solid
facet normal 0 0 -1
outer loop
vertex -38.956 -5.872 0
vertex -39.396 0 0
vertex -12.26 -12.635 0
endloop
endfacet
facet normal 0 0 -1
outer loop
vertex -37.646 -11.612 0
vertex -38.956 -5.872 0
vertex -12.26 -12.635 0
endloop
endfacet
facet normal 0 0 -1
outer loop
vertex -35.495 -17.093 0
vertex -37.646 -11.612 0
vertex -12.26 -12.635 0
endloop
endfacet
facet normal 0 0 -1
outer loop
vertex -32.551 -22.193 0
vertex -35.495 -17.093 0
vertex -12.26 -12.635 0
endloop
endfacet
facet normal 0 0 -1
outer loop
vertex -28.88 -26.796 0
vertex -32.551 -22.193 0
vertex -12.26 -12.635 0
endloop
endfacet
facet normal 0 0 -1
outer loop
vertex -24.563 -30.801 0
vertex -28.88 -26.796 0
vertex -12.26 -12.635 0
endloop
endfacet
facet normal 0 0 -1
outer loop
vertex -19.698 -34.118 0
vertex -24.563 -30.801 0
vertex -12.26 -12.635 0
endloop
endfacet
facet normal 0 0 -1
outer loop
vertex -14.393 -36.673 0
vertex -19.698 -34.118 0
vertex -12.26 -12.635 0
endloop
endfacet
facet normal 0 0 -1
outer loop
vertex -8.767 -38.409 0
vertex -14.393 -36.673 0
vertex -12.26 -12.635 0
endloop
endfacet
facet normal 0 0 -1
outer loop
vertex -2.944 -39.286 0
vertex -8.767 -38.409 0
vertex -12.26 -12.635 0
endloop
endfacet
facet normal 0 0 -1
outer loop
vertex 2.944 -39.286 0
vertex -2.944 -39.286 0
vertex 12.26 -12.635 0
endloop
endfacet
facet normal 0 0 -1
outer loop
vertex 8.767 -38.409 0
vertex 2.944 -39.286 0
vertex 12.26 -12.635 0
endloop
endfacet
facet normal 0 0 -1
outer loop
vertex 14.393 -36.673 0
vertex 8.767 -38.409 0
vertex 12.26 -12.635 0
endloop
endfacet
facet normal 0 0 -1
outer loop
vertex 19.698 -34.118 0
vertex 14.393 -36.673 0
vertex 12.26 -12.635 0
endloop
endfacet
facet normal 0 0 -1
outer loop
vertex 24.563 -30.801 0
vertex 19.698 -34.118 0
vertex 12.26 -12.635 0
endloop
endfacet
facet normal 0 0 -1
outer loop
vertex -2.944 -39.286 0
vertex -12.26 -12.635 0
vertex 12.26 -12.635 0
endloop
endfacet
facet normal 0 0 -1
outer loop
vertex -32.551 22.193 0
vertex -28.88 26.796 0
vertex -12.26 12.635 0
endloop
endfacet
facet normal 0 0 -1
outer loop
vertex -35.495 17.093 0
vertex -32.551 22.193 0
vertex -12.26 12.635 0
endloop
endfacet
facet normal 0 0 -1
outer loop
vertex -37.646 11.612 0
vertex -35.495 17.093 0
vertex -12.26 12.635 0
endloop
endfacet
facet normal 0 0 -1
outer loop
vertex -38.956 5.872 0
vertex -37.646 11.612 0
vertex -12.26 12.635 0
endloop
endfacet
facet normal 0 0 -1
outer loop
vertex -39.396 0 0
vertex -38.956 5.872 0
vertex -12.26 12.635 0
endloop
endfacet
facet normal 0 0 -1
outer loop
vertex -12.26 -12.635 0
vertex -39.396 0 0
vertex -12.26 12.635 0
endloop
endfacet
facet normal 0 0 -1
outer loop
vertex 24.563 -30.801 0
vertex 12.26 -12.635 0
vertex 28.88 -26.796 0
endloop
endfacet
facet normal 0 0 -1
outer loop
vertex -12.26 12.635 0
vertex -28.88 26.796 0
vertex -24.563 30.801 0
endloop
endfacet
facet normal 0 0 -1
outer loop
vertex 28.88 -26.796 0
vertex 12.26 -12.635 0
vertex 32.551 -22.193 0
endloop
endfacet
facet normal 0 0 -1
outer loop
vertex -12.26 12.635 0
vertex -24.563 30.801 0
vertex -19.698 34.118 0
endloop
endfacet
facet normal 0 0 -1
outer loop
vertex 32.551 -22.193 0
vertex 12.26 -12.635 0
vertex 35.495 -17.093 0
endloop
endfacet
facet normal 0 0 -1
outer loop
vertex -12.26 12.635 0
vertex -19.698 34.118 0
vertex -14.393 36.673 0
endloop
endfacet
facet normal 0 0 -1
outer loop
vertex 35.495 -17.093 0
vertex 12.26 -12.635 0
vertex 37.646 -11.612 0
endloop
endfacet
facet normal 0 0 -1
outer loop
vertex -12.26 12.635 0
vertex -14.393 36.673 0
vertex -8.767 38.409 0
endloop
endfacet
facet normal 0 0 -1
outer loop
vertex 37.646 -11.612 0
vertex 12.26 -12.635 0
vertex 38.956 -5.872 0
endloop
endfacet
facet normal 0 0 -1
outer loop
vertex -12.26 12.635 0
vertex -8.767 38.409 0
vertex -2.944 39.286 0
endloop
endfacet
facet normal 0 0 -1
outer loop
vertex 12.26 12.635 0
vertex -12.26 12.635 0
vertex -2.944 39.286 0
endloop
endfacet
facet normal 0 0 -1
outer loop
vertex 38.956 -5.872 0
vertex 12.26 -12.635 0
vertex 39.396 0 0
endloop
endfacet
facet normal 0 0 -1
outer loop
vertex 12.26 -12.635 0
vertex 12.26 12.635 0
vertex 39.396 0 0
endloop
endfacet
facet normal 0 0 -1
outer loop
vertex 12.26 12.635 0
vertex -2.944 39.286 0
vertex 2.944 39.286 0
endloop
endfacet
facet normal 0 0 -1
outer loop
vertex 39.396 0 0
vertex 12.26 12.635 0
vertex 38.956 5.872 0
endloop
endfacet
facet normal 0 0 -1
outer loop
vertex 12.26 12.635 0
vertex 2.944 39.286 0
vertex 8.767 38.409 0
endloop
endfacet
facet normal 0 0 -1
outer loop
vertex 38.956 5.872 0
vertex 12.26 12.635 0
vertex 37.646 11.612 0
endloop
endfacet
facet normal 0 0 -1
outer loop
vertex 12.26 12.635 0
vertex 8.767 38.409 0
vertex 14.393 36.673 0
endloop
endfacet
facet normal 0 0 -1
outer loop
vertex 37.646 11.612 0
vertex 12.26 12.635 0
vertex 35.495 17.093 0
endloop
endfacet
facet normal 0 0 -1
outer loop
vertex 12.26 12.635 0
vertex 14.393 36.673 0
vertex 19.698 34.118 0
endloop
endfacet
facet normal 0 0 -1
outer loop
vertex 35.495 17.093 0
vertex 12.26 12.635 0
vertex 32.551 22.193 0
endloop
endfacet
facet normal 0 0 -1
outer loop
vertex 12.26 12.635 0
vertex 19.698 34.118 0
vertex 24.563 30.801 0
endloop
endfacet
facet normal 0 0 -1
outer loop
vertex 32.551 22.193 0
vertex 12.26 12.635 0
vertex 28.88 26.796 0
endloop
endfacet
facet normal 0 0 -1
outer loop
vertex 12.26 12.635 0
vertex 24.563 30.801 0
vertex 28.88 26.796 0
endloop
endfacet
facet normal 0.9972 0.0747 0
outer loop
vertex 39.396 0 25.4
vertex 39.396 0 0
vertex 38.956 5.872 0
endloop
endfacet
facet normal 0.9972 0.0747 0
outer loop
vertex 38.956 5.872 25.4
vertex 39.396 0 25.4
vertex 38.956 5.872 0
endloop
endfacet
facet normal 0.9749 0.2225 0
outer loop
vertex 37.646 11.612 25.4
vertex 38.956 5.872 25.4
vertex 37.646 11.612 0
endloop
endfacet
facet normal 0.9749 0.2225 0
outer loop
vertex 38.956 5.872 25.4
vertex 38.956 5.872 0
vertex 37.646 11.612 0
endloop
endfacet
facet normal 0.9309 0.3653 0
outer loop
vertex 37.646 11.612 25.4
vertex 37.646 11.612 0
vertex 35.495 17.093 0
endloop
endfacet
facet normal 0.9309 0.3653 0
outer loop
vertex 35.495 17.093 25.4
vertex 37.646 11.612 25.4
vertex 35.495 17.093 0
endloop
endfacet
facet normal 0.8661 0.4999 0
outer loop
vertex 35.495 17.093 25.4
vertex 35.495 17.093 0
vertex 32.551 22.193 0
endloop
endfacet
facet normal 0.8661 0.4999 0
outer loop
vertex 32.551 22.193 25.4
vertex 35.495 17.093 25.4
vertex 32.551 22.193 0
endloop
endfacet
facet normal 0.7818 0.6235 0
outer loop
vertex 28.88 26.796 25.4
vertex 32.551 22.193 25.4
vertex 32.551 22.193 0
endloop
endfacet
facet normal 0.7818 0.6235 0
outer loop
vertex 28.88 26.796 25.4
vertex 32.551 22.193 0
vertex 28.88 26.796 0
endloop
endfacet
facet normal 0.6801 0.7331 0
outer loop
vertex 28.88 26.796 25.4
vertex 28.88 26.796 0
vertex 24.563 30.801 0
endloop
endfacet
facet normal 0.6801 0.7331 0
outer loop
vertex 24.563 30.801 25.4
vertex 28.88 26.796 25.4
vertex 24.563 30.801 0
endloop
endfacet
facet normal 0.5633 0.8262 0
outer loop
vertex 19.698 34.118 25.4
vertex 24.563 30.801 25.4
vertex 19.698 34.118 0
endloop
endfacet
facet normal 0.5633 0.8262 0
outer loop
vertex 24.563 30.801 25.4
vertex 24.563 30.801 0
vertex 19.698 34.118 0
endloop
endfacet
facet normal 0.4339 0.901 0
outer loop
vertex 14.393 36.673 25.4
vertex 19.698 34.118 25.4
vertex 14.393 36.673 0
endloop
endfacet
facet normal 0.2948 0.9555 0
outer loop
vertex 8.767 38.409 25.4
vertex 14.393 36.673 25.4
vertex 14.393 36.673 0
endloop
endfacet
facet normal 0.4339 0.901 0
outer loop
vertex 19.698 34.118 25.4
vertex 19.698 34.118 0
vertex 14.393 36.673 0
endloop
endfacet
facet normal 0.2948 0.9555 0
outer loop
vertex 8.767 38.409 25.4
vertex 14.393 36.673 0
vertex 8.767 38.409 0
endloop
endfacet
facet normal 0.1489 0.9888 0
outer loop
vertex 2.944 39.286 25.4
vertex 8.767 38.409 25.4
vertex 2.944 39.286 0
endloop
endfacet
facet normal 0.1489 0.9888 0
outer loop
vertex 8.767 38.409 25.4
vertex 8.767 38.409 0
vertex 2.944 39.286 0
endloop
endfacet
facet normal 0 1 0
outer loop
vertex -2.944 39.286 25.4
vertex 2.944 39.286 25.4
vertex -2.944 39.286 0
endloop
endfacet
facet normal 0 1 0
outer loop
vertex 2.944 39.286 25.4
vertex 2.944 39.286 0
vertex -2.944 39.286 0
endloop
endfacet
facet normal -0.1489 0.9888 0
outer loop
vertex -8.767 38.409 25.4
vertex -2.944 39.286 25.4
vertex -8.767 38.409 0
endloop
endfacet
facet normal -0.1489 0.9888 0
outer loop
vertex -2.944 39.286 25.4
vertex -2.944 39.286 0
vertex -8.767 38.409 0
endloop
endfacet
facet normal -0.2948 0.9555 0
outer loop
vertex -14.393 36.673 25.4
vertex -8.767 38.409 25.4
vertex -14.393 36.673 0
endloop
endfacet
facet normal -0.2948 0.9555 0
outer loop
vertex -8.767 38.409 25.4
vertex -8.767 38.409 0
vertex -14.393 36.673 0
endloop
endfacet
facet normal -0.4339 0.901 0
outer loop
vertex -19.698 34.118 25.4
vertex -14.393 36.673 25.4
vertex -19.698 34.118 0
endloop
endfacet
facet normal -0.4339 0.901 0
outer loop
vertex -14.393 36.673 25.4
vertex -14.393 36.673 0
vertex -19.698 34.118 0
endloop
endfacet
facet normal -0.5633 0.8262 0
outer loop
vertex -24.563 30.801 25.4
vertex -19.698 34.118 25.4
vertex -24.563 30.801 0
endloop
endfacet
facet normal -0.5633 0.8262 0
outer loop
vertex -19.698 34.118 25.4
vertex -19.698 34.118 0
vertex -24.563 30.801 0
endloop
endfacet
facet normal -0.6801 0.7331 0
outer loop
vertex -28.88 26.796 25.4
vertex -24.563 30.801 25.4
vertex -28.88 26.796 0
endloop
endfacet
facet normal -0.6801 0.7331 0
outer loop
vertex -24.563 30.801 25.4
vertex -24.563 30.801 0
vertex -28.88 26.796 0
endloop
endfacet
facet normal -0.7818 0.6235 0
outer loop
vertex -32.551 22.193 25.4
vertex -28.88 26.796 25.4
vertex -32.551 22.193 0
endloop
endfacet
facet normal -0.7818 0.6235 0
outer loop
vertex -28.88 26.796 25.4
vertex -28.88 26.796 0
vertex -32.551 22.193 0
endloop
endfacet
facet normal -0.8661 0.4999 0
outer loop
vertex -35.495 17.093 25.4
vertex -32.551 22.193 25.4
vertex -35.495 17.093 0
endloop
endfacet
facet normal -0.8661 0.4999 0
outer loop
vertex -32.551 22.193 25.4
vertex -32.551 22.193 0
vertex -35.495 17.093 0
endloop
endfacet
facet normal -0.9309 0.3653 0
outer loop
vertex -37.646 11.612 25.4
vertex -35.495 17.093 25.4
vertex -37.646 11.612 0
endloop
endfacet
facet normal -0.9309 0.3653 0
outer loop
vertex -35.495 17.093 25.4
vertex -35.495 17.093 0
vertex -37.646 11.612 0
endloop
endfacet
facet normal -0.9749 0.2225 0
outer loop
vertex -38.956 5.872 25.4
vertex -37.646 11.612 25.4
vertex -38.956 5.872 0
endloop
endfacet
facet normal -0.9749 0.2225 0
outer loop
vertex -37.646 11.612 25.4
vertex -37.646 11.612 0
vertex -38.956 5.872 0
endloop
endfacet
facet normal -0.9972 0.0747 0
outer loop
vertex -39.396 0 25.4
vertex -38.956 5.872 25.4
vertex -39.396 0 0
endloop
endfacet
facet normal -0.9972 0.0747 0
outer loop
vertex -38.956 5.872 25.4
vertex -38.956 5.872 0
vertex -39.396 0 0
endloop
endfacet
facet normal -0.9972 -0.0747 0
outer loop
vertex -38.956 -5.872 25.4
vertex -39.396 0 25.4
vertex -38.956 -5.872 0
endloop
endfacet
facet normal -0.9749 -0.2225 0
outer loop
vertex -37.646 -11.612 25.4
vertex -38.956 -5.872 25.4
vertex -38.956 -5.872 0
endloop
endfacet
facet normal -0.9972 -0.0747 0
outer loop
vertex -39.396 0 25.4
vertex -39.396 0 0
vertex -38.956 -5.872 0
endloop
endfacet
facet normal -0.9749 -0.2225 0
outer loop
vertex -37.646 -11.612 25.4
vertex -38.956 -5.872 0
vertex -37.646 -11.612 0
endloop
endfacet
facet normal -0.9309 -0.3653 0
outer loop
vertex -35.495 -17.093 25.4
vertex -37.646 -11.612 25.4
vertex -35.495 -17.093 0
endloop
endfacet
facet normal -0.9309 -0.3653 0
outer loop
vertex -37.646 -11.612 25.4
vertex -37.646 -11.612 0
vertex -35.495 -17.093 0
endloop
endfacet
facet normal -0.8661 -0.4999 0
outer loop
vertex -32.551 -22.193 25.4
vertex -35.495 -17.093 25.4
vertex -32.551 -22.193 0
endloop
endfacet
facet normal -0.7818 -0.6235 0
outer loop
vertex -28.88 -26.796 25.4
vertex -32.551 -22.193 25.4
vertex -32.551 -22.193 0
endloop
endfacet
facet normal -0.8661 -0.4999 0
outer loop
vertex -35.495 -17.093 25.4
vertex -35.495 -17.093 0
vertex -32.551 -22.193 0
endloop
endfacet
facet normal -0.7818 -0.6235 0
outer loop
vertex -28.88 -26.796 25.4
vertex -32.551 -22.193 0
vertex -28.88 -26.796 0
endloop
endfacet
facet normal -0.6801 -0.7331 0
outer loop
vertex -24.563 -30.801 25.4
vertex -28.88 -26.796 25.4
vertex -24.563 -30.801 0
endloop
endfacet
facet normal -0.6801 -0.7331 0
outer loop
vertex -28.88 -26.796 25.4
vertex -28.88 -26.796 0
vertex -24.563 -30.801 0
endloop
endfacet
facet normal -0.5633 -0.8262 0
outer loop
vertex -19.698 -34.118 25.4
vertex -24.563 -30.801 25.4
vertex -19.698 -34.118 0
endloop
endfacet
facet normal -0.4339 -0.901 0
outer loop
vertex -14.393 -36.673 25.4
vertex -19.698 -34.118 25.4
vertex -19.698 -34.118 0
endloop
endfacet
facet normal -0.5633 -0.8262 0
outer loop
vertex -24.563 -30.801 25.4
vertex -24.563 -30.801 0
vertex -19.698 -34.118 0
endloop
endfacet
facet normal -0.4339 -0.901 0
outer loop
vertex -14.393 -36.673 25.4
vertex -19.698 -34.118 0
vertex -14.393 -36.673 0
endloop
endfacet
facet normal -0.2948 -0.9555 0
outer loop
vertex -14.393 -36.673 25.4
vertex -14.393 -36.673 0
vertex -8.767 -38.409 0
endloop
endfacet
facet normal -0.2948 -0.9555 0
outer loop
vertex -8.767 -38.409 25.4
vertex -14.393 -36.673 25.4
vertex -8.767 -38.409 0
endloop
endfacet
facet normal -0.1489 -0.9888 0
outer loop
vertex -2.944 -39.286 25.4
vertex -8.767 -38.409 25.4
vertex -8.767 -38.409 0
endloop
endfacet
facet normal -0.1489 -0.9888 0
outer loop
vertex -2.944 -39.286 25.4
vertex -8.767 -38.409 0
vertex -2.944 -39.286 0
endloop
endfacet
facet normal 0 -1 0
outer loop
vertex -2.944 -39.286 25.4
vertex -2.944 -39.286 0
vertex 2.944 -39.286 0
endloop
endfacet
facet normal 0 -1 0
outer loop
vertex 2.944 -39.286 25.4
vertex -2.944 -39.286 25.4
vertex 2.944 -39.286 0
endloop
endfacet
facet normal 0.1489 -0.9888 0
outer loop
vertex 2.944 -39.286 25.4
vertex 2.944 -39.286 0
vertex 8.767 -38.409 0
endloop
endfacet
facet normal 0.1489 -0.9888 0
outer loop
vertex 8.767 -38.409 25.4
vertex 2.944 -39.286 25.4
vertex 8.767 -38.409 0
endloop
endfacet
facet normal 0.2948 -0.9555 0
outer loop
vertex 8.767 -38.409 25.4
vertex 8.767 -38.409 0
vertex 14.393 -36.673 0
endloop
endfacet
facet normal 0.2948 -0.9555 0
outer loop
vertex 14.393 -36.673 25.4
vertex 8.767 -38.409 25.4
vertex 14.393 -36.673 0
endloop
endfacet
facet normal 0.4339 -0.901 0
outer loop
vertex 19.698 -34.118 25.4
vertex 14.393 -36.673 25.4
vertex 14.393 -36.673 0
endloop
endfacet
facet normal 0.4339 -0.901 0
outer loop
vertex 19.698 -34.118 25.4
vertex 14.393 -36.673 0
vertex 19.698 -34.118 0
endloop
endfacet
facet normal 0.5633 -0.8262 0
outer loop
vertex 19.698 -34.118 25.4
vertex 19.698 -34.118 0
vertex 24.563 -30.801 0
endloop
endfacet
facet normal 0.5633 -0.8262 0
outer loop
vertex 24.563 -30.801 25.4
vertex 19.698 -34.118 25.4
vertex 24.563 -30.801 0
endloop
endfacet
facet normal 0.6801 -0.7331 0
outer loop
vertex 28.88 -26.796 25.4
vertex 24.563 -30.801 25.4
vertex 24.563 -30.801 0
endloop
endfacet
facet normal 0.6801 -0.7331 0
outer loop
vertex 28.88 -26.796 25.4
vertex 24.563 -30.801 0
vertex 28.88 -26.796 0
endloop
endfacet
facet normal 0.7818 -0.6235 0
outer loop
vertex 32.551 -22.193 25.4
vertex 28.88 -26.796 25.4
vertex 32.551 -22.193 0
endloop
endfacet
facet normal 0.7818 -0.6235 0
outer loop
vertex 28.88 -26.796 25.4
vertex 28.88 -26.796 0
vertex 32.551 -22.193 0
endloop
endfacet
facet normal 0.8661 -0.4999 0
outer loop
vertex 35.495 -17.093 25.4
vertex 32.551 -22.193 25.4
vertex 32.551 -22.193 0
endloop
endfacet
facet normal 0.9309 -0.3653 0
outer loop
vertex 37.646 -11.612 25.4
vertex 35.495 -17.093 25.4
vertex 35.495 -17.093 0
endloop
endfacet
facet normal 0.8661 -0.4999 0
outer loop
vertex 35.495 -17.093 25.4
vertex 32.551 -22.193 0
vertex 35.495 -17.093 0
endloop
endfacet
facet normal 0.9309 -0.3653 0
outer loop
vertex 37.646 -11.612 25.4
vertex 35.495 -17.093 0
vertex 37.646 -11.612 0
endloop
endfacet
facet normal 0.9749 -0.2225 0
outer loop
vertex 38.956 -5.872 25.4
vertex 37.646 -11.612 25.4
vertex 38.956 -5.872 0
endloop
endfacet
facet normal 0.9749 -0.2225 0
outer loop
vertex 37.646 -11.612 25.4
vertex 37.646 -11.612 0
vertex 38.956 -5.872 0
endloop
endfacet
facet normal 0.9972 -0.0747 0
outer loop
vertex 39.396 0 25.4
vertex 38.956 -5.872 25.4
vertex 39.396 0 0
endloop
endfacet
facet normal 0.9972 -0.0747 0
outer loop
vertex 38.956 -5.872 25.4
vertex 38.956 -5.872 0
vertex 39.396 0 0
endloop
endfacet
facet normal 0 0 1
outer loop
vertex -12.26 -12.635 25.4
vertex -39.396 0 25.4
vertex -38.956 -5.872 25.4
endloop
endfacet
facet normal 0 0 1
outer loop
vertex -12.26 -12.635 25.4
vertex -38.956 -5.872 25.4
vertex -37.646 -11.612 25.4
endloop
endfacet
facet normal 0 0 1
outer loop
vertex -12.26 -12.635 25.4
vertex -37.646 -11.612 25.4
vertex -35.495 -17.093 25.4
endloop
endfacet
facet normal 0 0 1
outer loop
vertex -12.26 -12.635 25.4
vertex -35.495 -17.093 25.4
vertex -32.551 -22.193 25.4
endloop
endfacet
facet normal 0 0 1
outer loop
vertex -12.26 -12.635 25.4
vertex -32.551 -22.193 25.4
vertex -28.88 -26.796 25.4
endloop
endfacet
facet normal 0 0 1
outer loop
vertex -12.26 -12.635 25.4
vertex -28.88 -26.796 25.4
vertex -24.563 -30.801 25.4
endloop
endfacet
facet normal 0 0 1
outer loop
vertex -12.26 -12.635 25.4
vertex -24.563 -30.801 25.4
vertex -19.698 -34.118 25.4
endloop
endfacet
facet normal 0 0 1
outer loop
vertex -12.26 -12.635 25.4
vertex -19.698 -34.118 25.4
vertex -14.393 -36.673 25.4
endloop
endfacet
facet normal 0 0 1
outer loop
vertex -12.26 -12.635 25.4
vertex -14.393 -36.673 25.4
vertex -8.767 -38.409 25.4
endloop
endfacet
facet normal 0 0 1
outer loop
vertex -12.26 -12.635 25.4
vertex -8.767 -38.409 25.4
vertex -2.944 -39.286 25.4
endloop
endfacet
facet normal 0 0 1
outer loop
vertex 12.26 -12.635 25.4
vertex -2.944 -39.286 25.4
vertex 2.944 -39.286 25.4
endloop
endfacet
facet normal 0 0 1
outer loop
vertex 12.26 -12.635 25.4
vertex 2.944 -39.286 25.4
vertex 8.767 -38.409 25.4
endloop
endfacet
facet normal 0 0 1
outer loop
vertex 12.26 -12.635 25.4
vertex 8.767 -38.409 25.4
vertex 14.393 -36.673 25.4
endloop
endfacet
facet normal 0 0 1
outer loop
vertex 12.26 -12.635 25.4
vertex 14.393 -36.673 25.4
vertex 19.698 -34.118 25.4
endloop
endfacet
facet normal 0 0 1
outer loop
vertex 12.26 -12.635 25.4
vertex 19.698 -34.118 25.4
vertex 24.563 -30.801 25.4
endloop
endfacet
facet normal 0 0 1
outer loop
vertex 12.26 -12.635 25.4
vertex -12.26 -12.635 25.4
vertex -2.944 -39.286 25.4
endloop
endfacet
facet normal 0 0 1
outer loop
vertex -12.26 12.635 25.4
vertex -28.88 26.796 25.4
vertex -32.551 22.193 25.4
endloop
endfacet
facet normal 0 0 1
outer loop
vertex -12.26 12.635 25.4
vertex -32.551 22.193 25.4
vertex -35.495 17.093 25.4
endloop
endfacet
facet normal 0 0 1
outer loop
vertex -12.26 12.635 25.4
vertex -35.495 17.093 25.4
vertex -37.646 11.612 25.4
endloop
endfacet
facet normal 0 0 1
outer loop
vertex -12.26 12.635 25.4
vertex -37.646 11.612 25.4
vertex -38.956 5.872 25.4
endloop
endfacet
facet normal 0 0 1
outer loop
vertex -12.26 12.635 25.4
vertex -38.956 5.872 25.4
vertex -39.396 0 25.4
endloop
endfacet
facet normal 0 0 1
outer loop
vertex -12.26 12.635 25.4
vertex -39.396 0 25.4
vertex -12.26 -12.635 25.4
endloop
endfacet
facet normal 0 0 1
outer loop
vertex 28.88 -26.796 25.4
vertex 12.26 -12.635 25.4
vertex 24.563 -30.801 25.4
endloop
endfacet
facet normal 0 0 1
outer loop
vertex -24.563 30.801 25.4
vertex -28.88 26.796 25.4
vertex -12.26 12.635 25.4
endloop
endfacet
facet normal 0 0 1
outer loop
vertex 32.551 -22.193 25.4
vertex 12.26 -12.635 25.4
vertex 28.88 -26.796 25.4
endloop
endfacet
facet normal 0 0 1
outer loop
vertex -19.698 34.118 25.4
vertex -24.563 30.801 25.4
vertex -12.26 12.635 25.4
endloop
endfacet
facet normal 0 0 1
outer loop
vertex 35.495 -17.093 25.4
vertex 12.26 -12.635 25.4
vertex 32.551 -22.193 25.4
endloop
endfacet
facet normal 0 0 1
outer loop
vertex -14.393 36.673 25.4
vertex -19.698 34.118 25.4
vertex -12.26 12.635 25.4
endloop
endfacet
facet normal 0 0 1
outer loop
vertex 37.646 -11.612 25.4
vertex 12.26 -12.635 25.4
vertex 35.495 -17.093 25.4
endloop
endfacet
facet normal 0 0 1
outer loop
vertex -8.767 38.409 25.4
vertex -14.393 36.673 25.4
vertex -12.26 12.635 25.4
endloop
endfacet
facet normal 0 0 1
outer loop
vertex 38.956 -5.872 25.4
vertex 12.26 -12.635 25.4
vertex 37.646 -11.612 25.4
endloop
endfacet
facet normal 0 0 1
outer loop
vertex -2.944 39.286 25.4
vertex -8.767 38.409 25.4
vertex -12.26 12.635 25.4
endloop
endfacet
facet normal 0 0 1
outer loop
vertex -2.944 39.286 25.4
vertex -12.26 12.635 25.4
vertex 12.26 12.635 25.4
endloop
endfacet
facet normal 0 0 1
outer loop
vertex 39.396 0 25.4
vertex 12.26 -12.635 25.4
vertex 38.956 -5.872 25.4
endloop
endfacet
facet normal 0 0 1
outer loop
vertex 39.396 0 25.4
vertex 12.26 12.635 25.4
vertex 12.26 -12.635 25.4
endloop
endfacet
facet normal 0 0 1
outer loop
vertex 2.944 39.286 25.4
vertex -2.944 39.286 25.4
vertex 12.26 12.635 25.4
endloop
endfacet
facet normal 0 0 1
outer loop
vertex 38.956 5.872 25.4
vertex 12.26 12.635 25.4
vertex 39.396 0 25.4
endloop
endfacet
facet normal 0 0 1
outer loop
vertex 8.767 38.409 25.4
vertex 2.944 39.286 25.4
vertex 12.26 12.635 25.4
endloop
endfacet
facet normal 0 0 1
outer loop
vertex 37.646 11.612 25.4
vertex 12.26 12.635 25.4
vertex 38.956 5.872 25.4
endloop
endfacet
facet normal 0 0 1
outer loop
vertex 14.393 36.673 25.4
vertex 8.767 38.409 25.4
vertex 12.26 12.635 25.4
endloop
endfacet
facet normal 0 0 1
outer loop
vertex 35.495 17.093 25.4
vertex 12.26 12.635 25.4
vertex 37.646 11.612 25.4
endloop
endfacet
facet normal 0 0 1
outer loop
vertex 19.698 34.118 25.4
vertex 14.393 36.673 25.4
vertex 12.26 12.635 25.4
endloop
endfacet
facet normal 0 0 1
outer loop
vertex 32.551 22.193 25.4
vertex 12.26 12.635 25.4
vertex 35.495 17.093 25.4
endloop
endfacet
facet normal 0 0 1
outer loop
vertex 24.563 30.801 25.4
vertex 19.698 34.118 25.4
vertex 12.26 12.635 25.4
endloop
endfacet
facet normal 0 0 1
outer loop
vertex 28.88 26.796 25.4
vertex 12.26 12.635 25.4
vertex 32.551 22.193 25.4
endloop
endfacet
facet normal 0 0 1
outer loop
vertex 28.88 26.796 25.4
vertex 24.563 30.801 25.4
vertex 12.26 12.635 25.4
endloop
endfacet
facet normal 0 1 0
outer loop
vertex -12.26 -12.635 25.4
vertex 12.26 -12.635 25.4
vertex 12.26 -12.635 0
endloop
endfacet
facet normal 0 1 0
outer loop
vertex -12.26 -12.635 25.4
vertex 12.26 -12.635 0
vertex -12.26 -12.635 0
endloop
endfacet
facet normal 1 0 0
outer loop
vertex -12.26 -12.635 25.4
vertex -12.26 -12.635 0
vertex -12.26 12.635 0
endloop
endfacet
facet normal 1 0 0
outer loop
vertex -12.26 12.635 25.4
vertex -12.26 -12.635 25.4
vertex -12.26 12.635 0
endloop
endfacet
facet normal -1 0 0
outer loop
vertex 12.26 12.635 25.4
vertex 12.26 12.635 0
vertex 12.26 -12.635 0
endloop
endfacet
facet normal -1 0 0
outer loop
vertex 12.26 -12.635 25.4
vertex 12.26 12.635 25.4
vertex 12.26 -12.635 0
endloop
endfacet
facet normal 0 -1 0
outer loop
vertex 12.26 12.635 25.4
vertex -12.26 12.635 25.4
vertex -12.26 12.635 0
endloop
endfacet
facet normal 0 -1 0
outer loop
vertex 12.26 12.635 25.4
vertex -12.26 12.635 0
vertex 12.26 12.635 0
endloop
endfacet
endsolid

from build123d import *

# Parameters (mm, degrees)
F0_R     = 39.39632
F1_DEPTH = 25.4


with BuildPart() as f1:
    # F0 (on Top) → F1 (new body)
    with BuildSketch(Plane.XY):
        Circle(F0_R)
        Polygon((-12.259586, -12.635498), (-12.259586, 0), (-12.259586, 12.635498), (0, 12.635498), (12.259586, 12.635498), (12.259586, 0), (12.259586, -12.635498), (0, -12.635498), align=None, mode=Mode.SUBTRACT)
    extrude(amount=F1_DEPTH)


solid = f1.part
